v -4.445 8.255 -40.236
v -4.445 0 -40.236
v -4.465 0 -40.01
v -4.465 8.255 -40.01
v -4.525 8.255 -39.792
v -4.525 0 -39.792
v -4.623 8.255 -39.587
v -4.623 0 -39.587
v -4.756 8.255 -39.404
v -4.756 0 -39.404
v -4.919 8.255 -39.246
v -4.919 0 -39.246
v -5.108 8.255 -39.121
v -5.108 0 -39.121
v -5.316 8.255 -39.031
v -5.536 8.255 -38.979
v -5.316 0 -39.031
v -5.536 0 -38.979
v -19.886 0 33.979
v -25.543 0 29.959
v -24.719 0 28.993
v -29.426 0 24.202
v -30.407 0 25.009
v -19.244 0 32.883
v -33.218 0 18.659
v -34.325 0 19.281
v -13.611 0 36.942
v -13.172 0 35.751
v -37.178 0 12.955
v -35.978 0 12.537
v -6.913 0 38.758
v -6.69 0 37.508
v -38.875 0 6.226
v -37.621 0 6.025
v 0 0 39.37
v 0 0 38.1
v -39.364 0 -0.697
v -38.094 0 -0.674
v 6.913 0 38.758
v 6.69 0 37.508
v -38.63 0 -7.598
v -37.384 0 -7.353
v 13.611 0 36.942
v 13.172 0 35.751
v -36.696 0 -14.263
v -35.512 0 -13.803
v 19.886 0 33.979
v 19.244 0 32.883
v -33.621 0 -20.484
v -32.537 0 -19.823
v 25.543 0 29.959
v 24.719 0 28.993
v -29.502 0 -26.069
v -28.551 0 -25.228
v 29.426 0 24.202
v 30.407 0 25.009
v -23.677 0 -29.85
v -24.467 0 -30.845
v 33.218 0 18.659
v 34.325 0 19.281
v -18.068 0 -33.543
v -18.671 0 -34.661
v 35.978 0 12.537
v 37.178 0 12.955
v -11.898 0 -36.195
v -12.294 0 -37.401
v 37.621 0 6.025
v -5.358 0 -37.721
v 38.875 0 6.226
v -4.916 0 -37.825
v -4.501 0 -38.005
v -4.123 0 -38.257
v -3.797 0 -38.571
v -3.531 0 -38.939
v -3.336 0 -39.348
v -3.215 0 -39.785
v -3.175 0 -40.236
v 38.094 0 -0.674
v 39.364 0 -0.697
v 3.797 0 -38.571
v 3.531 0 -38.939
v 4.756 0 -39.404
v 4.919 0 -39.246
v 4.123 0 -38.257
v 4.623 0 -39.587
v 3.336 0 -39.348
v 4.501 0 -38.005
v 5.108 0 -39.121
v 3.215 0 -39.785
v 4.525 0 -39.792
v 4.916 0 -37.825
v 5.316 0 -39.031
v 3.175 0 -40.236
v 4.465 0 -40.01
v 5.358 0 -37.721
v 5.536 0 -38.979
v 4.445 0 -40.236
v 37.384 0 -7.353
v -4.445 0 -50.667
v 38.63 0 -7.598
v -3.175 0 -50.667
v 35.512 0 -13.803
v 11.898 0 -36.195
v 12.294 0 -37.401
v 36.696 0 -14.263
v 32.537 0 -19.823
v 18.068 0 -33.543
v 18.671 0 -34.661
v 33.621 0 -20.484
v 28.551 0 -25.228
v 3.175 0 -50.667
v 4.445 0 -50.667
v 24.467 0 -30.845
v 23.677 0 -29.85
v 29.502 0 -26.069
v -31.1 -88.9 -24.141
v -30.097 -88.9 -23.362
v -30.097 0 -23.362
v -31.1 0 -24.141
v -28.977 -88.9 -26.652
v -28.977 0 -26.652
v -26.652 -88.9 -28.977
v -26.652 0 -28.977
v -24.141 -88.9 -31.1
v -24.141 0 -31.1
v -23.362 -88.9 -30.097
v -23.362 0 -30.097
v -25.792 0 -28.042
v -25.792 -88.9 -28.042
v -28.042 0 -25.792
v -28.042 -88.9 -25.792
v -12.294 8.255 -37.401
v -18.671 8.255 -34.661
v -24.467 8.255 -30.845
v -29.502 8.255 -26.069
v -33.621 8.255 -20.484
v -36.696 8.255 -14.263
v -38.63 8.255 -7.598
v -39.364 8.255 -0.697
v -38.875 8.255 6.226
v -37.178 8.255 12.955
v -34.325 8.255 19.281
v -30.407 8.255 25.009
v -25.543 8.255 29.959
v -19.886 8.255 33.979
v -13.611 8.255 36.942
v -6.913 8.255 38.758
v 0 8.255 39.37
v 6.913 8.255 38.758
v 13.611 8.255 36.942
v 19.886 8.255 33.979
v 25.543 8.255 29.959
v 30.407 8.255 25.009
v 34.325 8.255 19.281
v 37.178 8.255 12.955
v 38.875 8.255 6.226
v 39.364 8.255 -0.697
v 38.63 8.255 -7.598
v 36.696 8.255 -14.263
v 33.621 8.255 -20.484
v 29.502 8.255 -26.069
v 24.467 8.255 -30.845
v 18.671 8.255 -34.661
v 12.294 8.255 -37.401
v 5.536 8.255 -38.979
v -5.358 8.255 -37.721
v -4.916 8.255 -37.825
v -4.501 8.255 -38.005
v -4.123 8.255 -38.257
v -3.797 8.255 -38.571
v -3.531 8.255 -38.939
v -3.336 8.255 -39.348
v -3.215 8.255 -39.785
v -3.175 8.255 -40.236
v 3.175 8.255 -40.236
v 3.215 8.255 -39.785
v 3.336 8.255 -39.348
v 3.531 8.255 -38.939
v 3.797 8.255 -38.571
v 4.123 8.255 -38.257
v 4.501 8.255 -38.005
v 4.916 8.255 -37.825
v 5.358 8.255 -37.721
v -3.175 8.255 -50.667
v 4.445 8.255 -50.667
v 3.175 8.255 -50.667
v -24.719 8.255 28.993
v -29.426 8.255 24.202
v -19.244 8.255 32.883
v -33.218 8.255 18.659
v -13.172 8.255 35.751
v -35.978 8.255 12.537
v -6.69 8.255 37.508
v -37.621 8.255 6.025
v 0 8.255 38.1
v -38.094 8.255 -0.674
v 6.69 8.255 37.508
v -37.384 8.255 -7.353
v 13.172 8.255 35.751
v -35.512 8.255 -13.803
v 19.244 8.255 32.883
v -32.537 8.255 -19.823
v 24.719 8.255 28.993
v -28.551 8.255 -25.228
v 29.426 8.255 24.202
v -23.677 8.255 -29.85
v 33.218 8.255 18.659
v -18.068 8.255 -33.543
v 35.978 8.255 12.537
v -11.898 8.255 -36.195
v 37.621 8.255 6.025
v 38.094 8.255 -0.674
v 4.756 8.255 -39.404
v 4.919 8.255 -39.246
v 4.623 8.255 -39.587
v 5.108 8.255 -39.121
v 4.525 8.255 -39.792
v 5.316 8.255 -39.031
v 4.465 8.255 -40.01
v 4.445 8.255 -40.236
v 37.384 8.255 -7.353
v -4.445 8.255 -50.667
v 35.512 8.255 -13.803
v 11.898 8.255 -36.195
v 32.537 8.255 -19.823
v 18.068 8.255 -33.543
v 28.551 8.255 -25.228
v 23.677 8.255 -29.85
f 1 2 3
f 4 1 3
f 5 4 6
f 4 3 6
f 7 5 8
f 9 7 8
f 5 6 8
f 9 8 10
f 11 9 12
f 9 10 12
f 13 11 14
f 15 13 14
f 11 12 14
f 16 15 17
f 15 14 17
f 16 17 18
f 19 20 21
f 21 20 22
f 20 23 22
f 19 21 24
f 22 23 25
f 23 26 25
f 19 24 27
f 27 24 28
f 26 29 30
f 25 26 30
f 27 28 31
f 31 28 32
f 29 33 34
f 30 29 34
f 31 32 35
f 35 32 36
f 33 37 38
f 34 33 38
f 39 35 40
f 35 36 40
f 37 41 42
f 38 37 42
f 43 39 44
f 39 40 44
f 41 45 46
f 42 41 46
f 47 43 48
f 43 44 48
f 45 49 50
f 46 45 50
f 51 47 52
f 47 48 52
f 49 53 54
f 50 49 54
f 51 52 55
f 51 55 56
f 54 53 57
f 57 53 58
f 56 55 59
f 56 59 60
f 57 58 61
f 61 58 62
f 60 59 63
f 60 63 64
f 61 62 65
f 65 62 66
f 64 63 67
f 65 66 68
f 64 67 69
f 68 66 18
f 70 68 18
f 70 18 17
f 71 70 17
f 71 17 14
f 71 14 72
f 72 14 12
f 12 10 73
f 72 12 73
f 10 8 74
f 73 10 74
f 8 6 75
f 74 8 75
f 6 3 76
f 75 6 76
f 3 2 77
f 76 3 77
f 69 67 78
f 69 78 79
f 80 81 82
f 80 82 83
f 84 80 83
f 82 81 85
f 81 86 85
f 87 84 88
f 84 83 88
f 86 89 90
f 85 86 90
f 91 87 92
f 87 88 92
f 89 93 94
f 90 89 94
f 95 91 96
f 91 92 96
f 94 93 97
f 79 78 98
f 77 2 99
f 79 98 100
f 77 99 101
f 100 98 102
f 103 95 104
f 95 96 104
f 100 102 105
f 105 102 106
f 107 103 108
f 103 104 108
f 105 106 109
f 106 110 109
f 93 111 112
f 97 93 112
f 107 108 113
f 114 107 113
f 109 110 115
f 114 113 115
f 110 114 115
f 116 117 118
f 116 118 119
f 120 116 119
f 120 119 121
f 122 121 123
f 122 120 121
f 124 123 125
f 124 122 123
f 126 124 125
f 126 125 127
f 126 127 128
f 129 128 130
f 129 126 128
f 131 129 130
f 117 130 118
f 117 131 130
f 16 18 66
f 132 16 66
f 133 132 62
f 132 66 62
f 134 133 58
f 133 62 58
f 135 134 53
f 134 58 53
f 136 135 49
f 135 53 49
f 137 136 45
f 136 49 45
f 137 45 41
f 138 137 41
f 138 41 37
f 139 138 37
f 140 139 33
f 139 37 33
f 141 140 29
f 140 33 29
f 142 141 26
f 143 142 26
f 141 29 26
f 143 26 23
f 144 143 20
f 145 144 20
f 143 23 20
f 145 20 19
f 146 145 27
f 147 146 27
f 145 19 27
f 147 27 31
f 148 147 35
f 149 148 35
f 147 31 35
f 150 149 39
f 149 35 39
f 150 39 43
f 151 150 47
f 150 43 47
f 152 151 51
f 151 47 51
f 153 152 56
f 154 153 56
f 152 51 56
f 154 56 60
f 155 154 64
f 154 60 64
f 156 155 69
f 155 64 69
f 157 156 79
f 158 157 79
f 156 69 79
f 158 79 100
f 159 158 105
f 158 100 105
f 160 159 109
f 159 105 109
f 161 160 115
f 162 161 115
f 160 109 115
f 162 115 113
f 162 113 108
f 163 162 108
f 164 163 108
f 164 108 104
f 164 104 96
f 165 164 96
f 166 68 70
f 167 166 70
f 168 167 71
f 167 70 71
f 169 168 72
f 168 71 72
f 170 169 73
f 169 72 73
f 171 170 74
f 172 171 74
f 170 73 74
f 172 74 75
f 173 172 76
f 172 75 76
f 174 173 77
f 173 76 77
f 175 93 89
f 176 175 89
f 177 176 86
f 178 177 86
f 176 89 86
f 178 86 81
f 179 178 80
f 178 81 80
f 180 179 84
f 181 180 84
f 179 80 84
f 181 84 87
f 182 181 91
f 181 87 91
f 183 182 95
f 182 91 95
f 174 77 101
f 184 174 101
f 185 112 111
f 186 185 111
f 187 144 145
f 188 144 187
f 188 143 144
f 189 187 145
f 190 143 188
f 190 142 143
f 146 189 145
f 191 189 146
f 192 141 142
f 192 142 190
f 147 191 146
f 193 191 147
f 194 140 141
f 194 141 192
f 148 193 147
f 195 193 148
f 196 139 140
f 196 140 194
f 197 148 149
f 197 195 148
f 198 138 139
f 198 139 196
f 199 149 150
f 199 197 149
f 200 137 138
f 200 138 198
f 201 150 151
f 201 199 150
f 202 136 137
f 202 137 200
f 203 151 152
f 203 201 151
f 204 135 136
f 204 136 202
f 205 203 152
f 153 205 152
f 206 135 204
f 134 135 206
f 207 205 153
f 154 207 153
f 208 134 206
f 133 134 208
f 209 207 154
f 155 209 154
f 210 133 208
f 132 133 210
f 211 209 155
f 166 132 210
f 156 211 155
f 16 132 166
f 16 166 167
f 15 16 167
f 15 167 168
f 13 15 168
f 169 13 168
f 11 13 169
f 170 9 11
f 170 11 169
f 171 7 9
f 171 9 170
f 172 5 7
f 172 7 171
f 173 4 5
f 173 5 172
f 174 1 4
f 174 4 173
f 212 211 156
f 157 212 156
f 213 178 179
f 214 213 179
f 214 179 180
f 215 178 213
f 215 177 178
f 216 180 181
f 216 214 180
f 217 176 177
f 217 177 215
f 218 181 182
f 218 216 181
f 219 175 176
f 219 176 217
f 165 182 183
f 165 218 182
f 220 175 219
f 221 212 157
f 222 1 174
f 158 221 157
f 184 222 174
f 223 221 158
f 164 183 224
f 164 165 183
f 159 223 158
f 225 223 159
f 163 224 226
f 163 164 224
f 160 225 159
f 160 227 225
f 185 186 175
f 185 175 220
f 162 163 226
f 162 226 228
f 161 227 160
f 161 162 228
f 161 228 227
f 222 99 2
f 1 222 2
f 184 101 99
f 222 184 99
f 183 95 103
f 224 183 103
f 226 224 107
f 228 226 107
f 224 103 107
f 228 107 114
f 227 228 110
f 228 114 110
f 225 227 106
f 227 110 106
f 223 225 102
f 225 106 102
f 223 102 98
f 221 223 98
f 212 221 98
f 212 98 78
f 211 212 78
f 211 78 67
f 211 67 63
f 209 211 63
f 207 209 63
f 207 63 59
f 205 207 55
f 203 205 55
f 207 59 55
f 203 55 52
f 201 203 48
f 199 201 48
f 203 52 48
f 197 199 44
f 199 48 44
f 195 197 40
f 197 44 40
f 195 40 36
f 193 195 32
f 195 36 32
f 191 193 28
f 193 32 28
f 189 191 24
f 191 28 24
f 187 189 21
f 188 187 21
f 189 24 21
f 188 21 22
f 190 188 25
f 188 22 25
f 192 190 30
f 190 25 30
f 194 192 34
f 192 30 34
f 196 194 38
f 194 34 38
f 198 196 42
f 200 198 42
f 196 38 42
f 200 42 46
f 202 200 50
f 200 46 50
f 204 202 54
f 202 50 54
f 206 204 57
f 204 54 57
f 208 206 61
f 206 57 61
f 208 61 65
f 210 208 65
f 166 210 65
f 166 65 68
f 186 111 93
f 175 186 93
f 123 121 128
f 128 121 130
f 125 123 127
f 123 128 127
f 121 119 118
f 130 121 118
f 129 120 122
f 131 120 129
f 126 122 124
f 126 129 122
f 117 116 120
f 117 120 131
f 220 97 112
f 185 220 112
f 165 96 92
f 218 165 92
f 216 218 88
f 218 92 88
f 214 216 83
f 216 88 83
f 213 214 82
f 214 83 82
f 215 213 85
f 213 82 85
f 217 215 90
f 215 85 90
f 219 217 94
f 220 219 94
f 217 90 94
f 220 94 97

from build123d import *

# Parameters (mm, degrees)
BASE_FLANGE1_DEPTH = 8.255
BASE_FLANGE3_START = 88.9
BASE_FLANGE3_DEPTH = 88.9


# Read off the part's stored shape, not the designer's step: Base-Flange1
# Sheet-metal steps are written as plain solids
with BuildPart() as part:
    # Base-Flange1 outline → Base-Flange1 (new body)
    with BuildSketch(Plane(origin=(0, 0, 0), x_dir=(1, 0, 0), z_dir=(0, 1, 0))):
        with BuildLine():
            Line((-3.175, 40.236157558), (-3.175, 50.667477859))
            Line((-3.175, 50.667477859), (-4.445, 50.667477859))
            Line((-4.445, 50.667477859), (-4.445, 40.236157558))
            ThreePointArc((-4.445, 40.236157558), (-4.755908226, 39.403665534), (-5.53640625, 38.978777634))
            ThreePointArc((-5.53640625, 38.978777634), (0, -39.37), (5.53640625, 38.978777634))
            ThreePointArc((5.53640625, 38.978777634), (4.755908226, 39.403665534), (4.445, 40.236157558))
            Line((4.445, 40.236157558), (4.445, 50.667477859))
            Line((4.445, 50.667477859), (3.175, 50.667477859))
            Line((3.175, 50.667477859), (3.175, 40.236157558))
            ThreePointArc((3.175, 40.236157558), (3.796816452, 38.571173511), (5.3578125, 37.72139771))
            ThreePointArc((5.3578125, 37.72139771), (0, -38.1), (-5.3578125, 37.72139771))
            ThreePointArc((-5.3578125, 37.72139771), (-3.796816452, 38.571173511), (-3.175, 40.236157558))
        make_face()
    extrude(amount=BASE_FLANGE1_DEPTH)


with BuildPart() as body_2:
    # Sketch14 → Base-Flange3 (new body)
    with BuildSketch(Plane.XZ.offset(BASE_FLANGE3_START)):
        with BuildLine():
            Line((-24.140597875, -31.100296369), (-23.361868911, -30.097061002))
            ThreePointArc((-23.361868911, -30.097061002), (-26.940768363, -26.940768363), (-30.097061002, -23.361868911))
            Line((-30.097061002, -23.361868911), (-31.100296369, -24.140597875))
            ThreePointArc((-31.100296369, -24.140597875), (-27.838793975, -27.838793975), (-24.140597875, -31.100296369))
        make_face()
    extrude(amount=-BASE_FLANGE3_DEPTH)


solid = Compound([part.part, body_2.part])
